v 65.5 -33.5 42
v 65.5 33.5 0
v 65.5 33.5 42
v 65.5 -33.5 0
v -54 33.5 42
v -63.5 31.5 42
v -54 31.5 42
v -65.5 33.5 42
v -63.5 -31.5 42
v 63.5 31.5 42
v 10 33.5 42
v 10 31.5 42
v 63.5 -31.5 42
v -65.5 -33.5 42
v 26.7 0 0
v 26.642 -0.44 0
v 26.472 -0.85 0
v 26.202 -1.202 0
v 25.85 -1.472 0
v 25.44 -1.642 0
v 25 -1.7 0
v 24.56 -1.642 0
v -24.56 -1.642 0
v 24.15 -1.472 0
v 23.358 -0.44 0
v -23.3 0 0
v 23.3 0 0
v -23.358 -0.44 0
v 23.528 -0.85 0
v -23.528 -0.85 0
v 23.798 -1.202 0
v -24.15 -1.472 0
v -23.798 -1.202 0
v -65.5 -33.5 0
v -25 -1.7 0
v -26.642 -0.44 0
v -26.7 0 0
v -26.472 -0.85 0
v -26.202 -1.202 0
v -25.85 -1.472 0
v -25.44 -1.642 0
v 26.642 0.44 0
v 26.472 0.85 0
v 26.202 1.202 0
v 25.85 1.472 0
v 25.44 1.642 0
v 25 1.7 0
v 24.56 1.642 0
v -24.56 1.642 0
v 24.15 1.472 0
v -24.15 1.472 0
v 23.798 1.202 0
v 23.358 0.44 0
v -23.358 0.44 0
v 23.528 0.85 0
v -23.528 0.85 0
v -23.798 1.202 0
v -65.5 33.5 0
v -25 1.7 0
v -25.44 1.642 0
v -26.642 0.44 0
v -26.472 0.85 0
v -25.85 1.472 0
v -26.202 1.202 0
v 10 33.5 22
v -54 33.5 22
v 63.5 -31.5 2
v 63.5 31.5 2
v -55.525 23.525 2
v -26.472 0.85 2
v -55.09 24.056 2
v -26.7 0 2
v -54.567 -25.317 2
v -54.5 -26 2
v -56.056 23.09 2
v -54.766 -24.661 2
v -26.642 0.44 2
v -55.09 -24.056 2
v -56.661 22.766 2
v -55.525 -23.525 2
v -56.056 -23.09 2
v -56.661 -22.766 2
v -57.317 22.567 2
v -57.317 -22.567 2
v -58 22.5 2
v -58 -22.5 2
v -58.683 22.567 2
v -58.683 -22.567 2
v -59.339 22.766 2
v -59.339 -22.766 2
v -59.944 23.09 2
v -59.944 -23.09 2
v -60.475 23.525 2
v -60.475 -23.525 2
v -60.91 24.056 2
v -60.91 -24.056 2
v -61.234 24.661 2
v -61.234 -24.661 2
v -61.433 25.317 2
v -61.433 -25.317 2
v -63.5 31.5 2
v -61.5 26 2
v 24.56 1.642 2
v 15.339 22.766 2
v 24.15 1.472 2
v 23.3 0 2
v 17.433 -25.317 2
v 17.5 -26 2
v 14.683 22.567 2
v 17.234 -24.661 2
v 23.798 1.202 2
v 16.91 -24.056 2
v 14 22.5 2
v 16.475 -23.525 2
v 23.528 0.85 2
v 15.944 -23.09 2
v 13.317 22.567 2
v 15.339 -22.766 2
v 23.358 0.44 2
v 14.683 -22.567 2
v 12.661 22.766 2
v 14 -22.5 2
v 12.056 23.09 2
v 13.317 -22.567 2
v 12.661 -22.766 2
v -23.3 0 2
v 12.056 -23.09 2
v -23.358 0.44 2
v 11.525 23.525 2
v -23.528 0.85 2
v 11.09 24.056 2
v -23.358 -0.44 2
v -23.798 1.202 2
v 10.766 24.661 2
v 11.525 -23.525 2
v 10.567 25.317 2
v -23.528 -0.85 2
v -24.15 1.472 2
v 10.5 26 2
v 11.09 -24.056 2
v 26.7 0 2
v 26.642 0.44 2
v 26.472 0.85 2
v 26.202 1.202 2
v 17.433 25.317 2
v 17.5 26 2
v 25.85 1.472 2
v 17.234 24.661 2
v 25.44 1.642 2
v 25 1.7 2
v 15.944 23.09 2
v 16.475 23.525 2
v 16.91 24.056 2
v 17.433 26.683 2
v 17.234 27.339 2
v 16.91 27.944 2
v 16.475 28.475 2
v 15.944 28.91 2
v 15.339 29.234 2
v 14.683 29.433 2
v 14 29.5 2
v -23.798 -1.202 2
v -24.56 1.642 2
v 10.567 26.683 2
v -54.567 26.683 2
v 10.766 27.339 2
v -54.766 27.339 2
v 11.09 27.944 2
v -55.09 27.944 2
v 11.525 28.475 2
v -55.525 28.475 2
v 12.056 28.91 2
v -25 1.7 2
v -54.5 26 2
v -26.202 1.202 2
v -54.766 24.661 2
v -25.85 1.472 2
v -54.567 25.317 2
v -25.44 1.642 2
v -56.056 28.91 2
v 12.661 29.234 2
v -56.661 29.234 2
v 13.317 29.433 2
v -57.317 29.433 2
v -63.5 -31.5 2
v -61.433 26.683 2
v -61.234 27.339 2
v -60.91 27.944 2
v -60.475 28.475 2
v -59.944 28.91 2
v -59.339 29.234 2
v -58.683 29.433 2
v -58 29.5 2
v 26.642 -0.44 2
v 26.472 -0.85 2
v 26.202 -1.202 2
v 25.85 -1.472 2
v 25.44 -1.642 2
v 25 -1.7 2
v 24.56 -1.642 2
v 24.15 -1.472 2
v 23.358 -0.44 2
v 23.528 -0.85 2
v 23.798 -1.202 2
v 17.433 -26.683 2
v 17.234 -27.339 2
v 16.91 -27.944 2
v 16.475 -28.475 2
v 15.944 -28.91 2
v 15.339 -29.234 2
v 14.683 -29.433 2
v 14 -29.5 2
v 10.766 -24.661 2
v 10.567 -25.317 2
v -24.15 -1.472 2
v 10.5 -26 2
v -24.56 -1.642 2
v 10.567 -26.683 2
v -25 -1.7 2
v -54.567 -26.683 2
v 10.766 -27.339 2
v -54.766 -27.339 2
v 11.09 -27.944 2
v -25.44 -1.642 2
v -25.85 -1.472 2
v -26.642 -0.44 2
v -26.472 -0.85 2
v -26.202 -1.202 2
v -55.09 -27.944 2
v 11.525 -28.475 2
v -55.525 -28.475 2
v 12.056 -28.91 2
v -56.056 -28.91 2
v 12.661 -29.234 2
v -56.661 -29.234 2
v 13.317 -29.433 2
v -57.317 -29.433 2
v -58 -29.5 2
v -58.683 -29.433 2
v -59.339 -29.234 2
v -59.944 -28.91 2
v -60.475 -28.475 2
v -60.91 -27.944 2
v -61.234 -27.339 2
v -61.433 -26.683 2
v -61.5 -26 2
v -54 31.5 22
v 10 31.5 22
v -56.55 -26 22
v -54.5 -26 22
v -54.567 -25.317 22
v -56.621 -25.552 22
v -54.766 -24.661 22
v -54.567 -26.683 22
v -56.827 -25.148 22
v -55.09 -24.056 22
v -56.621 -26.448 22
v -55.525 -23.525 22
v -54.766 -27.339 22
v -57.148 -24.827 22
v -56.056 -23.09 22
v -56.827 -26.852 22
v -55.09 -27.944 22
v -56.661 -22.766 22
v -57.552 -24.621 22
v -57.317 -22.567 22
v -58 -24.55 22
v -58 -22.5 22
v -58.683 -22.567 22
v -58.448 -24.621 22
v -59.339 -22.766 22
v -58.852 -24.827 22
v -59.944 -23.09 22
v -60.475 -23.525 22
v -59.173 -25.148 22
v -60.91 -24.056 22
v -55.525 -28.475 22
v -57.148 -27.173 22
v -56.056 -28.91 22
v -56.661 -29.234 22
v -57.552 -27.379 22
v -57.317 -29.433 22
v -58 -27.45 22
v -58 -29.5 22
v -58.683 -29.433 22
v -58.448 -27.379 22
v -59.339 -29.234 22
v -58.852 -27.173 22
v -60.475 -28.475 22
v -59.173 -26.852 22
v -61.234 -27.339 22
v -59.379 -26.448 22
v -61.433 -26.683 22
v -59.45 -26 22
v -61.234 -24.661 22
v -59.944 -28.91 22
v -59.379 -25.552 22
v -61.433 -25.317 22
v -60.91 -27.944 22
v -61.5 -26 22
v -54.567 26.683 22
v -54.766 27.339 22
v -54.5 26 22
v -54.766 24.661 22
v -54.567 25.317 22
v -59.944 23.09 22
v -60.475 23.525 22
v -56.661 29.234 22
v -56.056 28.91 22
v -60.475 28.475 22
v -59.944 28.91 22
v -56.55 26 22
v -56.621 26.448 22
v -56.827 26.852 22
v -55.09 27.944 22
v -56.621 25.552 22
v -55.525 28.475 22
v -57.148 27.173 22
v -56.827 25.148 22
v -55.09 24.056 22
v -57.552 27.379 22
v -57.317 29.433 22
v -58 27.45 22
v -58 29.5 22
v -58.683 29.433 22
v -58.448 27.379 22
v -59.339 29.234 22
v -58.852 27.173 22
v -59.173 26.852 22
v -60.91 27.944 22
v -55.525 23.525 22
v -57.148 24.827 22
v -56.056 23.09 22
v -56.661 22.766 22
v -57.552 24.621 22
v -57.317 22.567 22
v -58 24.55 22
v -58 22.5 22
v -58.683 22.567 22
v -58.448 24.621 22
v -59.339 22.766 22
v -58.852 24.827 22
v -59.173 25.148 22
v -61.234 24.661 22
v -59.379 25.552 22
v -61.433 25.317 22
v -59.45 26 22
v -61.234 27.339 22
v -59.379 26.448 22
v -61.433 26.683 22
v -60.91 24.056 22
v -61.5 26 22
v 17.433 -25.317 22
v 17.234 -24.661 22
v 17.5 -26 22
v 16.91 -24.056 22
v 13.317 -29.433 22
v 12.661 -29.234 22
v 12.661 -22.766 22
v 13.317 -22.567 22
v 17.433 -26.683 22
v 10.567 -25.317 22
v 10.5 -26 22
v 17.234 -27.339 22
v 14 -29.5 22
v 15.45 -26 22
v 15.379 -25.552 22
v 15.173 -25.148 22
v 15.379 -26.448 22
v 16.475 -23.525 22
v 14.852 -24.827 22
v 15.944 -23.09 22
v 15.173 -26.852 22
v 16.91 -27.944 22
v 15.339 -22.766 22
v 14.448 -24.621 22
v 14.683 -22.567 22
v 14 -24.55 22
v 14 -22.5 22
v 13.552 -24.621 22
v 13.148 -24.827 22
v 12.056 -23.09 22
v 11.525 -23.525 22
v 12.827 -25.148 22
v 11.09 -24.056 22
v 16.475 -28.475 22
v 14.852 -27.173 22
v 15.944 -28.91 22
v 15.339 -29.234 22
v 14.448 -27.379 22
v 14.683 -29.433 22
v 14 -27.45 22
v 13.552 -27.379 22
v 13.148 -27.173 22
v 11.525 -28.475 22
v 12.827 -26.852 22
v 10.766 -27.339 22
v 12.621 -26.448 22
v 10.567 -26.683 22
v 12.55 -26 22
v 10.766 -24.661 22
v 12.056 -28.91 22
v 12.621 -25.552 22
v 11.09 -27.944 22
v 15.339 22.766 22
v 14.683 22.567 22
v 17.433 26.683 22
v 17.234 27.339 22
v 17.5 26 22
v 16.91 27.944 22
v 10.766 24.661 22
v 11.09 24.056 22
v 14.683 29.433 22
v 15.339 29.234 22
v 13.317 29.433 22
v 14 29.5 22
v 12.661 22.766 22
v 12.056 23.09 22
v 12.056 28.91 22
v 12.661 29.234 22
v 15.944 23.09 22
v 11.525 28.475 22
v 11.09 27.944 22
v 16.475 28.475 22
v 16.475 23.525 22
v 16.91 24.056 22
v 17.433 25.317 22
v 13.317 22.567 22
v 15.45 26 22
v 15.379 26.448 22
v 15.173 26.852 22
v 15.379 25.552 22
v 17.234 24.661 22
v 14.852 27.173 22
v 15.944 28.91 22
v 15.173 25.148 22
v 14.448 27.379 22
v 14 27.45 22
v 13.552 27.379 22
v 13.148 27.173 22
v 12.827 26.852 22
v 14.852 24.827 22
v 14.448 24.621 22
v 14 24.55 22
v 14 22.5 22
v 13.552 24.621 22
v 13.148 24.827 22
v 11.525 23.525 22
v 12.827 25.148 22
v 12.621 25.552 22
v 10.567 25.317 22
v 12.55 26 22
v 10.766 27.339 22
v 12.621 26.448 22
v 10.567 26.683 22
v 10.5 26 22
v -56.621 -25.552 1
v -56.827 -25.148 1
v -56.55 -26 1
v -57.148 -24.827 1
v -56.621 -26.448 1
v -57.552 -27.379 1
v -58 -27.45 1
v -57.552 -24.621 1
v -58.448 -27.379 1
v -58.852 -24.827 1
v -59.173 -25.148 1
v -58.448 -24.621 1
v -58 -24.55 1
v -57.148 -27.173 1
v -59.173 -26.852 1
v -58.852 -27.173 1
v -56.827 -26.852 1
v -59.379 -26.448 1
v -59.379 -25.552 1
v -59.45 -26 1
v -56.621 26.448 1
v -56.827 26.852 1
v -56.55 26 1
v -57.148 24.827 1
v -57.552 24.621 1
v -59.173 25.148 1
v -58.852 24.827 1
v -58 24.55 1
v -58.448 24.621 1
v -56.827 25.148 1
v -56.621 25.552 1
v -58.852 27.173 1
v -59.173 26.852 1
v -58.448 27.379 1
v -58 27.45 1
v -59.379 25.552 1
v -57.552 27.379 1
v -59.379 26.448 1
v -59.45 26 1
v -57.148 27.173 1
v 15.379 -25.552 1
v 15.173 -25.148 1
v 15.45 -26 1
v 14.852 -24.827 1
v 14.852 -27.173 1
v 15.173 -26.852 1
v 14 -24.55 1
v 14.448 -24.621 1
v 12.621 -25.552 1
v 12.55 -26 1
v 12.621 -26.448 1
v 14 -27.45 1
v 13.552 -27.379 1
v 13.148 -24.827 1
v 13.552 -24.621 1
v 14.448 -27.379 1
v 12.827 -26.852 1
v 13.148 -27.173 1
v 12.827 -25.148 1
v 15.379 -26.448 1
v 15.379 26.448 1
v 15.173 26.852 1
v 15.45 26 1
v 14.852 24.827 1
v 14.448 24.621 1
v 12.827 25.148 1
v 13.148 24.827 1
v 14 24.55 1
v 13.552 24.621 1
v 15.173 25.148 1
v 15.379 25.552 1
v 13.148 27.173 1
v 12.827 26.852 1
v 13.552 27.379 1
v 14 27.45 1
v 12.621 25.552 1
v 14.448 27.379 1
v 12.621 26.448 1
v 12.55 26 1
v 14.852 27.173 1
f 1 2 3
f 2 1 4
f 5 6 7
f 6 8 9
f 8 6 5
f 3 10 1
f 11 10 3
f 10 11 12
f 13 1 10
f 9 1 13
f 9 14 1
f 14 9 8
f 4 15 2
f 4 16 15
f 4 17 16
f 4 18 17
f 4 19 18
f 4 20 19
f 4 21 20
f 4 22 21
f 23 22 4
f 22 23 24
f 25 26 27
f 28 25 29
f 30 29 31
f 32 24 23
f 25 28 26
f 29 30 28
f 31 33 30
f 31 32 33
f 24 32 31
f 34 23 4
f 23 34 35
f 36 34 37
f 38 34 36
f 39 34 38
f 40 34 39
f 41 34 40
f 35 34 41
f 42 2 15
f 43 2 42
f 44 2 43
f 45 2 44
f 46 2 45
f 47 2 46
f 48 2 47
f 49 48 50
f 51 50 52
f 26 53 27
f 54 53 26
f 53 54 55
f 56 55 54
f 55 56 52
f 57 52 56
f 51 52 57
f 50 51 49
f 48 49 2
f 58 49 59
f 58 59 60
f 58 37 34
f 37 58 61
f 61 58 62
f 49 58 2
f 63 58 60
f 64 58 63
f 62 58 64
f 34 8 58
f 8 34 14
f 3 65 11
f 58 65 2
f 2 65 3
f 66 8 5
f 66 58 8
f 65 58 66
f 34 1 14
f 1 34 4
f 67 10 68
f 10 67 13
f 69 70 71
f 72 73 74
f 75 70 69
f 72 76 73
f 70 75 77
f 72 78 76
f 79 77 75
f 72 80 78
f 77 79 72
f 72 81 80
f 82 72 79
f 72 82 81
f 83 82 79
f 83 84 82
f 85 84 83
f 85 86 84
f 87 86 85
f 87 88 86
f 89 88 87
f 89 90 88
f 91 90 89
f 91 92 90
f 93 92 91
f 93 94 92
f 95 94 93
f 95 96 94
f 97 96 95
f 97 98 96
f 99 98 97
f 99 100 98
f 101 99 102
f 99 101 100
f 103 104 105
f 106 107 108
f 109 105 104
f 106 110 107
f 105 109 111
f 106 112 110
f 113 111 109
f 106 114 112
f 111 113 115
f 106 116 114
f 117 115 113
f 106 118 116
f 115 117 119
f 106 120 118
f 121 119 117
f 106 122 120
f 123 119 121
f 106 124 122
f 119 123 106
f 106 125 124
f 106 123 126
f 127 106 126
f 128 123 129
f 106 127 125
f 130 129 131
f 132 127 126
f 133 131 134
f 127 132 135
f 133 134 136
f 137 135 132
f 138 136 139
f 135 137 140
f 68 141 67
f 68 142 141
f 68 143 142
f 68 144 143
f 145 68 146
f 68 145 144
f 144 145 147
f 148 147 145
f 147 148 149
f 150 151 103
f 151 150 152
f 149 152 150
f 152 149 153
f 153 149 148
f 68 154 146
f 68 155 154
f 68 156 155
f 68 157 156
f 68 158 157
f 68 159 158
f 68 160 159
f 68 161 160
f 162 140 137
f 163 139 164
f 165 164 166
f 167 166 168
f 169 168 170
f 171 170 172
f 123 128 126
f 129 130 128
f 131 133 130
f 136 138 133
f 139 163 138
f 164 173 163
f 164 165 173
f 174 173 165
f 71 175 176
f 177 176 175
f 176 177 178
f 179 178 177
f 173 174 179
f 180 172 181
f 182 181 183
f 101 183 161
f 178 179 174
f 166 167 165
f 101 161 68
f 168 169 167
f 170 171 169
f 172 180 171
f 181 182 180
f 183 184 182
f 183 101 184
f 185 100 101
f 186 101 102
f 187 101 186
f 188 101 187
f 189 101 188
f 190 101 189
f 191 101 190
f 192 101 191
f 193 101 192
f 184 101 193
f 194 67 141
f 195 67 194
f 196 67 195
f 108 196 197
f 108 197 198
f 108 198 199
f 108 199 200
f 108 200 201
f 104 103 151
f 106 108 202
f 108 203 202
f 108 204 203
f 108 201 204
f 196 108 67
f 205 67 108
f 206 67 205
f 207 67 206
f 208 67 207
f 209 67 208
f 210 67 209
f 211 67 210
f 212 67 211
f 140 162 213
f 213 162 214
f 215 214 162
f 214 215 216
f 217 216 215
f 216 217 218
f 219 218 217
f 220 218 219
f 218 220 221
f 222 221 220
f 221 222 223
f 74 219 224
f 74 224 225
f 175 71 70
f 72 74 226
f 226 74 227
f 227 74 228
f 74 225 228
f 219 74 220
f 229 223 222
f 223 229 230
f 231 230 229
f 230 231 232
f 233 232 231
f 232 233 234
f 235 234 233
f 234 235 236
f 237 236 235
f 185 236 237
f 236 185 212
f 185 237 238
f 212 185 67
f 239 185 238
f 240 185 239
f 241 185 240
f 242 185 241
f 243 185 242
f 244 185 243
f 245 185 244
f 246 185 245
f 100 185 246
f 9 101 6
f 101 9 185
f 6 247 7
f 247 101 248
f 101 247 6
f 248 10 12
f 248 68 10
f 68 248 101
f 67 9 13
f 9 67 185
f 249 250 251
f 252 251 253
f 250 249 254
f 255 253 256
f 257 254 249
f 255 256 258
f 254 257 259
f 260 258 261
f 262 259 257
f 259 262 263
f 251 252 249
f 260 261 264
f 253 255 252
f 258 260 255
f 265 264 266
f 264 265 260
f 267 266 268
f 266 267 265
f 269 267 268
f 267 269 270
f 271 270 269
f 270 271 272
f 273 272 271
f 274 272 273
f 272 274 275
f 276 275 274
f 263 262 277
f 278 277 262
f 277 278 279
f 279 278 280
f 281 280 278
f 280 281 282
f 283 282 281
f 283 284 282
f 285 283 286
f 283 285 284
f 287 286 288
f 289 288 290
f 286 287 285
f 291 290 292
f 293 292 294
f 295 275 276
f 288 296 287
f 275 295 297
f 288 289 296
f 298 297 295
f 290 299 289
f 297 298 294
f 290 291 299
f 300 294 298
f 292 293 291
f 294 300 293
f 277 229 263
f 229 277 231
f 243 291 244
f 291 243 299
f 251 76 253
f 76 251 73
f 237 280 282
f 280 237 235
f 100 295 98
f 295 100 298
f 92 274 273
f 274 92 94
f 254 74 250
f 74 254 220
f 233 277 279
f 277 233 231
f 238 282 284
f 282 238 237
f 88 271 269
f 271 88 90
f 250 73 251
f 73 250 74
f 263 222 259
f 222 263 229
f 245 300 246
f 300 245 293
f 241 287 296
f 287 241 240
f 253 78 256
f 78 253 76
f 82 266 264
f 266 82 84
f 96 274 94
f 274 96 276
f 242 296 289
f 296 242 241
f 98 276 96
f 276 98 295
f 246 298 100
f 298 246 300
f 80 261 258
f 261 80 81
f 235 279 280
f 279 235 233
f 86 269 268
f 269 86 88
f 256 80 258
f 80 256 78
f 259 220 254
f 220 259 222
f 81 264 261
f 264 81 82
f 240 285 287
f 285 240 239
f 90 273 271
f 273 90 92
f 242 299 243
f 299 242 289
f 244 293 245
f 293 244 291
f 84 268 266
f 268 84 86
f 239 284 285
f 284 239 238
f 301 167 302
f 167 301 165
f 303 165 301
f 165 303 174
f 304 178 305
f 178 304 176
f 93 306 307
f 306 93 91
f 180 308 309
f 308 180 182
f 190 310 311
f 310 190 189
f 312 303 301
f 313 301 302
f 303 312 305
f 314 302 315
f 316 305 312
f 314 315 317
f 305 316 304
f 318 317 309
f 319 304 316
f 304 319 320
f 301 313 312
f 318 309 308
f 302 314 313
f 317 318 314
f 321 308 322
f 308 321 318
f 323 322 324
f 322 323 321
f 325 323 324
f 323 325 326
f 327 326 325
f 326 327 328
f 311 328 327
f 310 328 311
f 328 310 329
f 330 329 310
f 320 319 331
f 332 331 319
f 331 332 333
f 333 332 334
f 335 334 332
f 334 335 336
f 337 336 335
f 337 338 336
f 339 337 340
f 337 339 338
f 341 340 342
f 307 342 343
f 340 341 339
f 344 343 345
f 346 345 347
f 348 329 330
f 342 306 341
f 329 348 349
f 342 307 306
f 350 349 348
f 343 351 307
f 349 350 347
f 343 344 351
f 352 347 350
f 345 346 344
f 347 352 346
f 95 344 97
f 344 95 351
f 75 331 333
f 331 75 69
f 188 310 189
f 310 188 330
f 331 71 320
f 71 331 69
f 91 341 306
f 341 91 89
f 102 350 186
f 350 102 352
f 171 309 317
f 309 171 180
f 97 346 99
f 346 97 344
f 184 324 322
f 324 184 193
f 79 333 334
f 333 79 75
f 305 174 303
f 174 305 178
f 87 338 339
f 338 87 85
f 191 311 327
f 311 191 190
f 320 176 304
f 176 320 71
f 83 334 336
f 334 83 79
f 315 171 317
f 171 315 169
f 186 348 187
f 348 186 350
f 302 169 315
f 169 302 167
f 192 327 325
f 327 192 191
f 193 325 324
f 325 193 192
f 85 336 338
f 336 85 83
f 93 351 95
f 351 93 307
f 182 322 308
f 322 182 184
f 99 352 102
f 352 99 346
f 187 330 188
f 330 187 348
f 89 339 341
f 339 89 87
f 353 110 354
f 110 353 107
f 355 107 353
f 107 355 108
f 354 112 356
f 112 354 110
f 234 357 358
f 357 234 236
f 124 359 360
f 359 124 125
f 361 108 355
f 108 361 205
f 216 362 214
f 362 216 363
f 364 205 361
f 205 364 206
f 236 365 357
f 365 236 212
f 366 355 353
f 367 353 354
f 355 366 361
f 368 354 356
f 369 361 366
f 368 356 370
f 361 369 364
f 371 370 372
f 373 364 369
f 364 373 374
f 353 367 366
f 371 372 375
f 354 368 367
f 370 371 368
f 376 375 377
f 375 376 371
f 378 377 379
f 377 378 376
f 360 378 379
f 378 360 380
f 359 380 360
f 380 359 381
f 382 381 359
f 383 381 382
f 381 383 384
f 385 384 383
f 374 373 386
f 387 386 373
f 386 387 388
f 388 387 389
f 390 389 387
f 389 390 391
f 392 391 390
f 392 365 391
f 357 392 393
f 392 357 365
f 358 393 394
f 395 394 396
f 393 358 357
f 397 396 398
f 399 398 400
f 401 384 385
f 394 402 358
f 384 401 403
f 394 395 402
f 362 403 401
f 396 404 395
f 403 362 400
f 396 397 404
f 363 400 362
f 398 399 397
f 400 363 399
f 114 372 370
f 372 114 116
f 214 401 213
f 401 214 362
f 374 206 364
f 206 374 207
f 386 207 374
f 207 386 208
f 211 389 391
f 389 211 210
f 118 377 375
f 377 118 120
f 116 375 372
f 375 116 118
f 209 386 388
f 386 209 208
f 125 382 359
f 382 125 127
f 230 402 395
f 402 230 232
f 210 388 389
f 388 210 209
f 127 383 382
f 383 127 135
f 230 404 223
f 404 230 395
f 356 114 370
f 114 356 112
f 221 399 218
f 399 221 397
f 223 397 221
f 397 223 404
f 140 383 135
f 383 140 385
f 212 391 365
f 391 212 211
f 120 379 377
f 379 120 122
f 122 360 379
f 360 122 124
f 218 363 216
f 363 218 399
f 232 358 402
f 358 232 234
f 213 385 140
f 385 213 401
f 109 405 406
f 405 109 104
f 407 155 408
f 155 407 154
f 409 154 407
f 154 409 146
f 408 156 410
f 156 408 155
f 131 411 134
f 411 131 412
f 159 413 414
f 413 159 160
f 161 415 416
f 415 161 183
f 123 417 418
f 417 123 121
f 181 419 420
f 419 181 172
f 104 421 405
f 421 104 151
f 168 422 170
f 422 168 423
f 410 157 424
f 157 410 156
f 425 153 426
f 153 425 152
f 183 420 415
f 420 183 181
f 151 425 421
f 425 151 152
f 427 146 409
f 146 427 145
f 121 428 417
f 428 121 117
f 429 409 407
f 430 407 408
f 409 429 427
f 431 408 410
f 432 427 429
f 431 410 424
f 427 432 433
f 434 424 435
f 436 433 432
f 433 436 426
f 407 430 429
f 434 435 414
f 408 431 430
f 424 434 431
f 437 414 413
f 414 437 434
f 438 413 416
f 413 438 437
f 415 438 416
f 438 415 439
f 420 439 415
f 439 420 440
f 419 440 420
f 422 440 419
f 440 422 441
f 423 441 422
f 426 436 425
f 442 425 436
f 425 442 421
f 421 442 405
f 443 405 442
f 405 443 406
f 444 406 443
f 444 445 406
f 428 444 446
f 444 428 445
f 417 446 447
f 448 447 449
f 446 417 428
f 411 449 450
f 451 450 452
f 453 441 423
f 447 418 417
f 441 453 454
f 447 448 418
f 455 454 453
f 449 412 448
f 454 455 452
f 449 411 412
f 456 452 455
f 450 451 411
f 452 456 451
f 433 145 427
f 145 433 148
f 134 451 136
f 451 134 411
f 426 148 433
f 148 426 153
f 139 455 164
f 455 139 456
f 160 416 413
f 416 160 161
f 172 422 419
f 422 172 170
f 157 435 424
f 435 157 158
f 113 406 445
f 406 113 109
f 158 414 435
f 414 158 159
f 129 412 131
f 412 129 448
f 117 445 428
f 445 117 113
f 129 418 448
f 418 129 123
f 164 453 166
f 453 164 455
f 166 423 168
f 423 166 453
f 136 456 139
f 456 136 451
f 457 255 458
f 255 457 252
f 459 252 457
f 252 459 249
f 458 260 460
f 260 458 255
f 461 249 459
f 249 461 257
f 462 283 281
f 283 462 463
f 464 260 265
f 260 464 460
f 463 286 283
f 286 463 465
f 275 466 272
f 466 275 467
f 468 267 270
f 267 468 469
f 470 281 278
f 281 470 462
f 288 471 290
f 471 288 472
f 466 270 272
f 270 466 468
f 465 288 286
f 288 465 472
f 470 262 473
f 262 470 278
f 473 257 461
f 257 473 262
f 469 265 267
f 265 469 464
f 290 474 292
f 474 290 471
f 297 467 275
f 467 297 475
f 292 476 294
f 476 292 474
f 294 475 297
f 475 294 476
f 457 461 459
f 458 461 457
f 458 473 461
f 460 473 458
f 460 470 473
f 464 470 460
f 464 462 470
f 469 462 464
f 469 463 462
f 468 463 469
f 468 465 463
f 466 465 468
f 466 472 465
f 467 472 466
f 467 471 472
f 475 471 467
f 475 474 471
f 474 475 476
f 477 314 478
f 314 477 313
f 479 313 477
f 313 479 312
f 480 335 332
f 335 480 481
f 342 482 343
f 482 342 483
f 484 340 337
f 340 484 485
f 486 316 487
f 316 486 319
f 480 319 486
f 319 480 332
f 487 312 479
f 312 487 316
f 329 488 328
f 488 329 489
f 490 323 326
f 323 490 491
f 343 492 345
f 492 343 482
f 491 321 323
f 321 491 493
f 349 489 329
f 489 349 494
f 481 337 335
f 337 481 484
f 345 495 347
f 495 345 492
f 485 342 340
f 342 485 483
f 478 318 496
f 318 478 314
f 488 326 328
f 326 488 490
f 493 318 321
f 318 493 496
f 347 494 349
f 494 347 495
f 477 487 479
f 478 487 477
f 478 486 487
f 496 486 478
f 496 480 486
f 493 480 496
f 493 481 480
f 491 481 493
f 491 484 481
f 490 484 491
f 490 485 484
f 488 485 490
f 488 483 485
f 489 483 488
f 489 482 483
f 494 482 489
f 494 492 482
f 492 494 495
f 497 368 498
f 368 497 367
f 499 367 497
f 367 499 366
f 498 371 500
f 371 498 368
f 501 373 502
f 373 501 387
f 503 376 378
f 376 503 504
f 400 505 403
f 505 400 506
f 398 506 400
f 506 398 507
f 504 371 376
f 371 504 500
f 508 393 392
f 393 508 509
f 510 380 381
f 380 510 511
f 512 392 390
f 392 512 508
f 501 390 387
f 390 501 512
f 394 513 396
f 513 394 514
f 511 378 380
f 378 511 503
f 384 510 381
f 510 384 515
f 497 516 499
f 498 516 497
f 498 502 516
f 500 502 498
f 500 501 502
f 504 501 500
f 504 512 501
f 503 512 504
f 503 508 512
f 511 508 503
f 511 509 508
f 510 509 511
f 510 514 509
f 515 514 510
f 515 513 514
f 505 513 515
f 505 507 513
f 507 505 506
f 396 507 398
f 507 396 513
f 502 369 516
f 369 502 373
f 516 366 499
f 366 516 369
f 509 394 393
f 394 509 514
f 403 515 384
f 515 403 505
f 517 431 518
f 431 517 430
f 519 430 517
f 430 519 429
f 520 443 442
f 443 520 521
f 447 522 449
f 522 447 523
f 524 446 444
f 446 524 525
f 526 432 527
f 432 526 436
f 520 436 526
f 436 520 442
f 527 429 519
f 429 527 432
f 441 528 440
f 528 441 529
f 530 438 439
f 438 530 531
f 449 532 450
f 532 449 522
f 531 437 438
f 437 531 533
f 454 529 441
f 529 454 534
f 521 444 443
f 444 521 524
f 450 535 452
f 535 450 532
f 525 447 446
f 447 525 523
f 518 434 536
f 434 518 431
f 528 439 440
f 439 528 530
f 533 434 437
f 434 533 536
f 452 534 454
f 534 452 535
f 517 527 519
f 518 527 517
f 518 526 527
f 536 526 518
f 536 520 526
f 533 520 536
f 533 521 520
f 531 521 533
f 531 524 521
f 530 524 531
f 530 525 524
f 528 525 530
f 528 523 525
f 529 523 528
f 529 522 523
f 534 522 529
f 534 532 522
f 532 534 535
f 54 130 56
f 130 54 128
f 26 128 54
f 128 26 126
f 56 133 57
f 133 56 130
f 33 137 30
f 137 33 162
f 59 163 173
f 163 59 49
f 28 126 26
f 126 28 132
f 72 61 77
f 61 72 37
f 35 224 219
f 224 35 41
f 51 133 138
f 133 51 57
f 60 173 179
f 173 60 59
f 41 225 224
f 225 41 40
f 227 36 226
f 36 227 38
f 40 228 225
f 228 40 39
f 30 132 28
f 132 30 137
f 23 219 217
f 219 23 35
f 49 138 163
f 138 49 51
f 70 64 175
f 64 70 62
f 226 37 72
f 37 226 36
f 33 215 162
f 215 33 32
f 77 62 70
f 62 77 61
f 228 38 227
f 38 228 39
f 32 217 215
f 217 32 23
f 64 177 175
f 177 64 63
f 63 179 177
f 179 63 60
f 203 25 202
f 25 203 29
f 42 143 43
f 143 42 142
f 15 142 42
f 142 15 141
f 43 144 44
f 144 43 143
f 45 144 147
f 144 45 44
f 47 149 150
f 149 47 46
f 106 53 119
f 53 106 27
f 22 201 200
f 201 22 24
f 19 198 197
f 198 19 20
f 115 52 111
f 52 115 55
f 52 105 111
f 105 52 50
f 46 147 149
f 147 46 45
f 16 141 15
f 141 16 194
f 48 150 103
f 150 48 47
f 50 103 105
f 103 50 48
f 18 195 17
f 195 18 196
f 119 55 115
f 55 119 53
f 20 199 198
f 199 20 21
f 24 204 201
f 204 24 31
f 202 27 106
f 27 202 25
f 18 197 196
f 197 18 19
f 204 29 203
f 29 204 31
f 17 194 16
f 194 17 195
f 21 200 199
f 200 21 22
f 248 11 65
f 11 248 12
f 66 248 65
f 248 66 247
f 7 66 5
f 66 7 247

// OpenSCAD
// ferris/ctrl_box.scad (v7, 2026-09-03)
// Enclosure for the 80 x 60 control board (AtomS3R carrier, EasyEDA/JLCPCB).
// The board outline / hole pattern / Atom position are fixed in params.scad so
// this box can be printed BEFORE the PCB arrives; the layout must follow them.
//   PART="tray" : open-top tray, 4 standoffs (M3 self-tap Ø2.9), connector-edge
//                 wall (+Y) cut down so cables leave under the lid.
//   PART="lid"  : drop-in lid with a lip, window for the AtomS3R (screen/button),
//                 panel holes (E-stop 22 / pot 7 / button 16) + vent slots.

include <../params.scad>;

PART = "tray";

in_x = pcb_x + 2*box_clear + box_bay_w;     // 127: PCB (left) + panel bay (right)
pcb_ox = -box_bay_w/2;                      // PCB centre offset from the box centre
in_y = pcb_y + 2*box_clear;                 // 63
in_h = box_inner_h;                         // 45: E-stop body under the lid sets the depth
out_x = in_x + 2*box_wall;
out_y = in_y + 2*box_wall;
out_h = in_h + box_floor_t;

module holes2d() {
    for (sx = [-1, 1], sy = [-1, 1])
        translate([pcb_ox + sx * (pcb_x/2 - pcb_hole_inset), sy * (pcb_y/2 - pcb_hole_inset)]) children();
}

module tray() {
    difference() {
        union() {
            difference() {
                translate([-out_x/2, -out_y/2, 0]) cube([out_x, out_y, out_h]);
                translate([-in_x/2, -in_y/2, box_floor_t]) cube([in_x, in_y, out_h]);
            }
            // standoffs
            translate([0, 0, box_floor_t - 0.01])
                holes2d() cylinder(d = box_standoff_d, h = box_standoff_h + 0.01, $fn = 32);
        }
        // M3 self-tap pilots in the standoffs
        translate([0, 0, 1]) holes2d() cylinder(d = m3_thread, h = box_floor_t + box_standoff_h, $fn = 20);
        // connector-edge (+Y) wall cut, centred on the PCB
        translate([pcb_ox - box_conn_cut_w/2, out_y/2 - box_wall - 1, out_h - box_conn_cut_h])
            cube([box_conn_cut_w, box_wall + 2, box_conn_cut_h + 1]);
        // 2 x M3 mounting holes in the floor (zip-tie / screw to the base pad)
        for (sx = [-1, 1])
            translate([sx * 25, 0, -1]) cylinder(d = m3_clear, h = box_floor_t + 2, $fn = 24);
    }
}

module lid() {
    difference() {
        union() {
            translate([-out_x/2, -out_y/2, 0]) cube([out_x, out_y, box_wall]);
            // lip that drops inside the tray walls
            translate([-in_x/2 + tol, -in_y/2 + tol, box_wall - 0.01])
                difference() {
                    cube([in_x - 2*tol, in_y - 2*tol, box_lip]);
                    translate([box_wall, box_wall, -1]) cube([in_x - 2*tol - 2*box_wall, in_y - 2*tol - 2*box_wall, box_lip + 2]);
                }
        }
        // AtomS3R window (body 24 x 24 + play)
        translate([pcb_ox + pcb_atom_cx - pcb_x/2, pcb_atom_cy - pcb_y/2, -1])
            translate([-(pcb_atom_w + 1)/2, -(pcb_atom_w + 1)/2, 0])
                cube([pcb_atom_w + 1, pcb_atom_w + 1, box_wall + box_lip + 2]);
        // panel holes in the bay (positions relative to the box centre)
        for (h = [[panel_estop, panel_estop_hole_d], [panel_pot, panel_pot_hole_d], [panel_btn, panel_btn_hole_d]])
            translate([h[0][0], h[0][1], -1]) cylinder(d = h[1], h = box_wall + box_lip + 2, $fn = 48);
        // vent slots over the PCB's right half (drivers / regulator)
        for (i = [0 : 3])
            translate([pcb_ox + 8 + i * 8, -pcb_y/2 + 8, -1]) cube([3, pcb_y - 16, box_wall + 2]);
    }
}

if (PART == "tray") tray();
else if (PART == "lid") lid();
